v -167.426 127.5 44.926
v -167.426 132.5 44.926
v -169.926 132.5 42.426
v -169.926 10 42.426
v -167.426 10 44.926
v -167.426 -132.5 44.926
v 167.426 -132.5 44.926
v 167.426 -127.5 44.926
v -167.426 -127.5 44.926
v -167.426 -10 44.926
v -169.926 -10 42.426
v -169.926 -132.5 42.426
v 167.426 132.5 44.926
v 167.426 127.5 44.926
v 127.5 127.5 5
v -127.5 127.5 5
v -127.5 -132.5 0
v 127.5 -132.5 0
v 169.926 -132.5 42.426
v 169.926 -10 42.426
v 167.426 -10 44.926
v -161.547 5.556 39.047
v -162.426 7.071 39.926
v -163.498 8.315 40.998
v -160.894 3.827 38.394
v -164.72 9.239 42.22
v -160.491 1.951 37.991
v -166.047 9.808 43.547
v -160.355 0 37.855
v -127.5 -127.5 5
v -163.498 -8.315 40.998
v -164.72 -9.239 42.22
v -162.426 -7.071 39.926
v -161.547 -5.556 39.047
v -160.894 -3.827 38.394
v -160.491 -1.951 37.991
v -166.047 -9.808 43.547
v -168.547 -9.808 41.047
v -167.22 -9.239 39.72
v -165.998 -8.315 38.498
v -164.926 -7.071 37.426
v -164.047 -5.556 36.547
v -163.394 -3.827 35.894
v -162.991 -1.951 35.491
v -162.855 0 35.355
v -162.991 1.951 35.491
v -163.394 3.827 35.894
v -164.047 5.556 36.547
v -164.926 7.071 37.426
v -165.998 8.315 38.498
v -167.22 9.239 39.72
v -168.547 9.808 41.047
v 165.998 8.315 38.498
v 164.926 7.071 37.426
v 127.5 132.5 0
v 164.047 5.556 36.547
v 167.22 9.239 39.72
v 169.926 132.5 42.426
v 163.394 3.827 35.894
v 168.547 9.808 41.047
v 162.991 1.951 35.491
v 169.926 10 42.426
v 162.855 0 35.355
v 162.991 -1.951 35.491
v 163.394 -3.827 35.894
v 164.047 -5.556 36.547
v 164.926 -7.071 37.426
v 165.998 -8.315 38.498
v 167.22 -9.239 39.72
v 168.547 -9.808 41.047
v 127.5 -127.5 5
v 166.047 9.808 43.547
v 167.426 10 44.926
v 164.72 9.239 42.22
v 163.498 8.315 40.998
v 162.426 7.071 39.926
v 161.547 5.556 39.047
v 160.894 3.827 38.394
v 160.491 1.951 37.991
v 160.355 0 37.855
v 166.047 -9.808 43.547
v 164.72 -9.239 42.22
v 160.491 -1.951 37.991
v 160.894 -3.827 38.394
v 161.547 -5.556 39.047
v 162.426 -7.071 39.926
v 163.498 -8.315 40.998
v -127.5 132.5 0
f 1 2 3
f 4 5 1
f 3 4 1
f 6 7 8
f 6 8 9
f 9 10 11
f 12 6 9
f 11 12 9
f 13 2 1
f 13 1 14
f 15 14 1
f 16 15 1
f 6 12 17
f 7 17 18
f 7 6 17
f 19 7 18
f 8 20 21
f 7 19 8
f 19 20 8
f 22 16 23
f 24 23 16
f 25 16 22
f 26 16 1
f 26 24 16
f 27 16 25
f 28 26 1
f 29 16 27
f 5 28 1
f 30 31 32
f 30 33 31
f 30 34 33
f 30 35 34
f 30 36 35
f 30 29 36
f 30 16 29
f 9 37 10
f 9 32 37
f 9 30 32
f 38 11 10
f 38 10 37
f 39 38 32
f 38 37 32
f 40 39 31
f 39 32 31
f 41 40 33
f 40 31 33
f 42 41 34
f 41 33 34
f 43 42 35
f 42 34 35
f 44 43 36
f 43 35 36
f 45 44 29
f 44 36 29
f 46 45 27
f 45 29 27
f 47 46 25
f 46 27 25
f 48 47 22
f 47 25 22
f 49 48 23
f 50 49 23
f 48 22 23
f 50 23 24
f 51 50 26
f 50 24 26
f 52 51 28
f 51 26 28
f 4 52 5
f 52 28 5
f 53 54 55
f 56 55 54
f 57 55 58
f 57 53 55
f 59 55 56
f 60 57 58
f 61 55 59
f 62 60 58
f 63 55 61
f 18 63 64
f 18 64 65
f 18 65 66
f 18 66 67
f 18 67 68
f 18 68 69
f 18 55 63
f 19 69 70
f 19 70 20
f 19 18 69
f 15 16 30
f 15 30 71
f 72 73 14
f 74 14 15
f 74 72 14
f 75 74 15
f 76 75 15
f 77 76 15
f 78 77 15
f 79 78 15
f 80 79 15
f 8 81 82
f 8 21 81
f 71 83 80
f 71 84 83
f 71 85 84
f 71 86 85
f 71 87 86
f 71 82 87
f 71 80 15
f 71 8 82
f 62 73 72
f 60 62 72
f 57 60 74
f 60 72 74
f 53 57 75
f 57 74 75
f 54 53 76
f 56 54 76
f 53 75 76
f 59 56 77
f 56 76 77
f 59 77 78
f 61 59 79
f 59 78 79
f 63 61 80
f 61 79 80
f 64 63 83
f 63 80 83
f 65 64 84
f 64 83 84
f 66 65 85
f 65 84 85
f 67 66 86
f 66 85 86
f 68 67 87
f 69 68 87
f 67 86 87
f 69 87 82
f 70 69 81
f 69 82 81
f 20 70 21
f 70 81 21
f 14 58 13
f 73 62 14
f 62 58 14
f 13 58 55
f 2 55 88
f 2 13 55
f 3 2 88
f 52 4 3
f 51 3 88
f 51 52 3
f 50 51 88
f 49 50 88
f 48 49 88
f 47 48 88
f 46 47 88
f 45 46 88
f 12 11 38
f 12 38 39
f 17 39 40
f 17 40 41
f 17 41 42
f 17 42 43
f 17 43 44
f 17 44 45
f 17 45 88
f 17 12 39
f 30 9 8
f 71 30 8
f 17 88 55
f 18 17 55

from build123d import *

# Parameters (mm, degrees)
F0_W      = 255
F0_H      = 265
F1_DEPTH  = 5
F3_DEPTH  = 265
F4_R      = 10
F5_DEPTH  = 25
F7_DEPTH  = 25
F9_DEPTH  = 5
F11_DEPTH = 5


with BuildPart() as f1:
    # F0 (on Top) → F1 (new body)
    with BuildSketch(Plane.XY):
        Rectangle(F0_W, F0_H)
    extrude(amount=F1_DEPTH)

    # F2 (on face) → F3 (join)
    with BuildSketch(Plane.XZ.offset(132.5)):
        Polygon((-169.9264068712, 42.4264068712), (-127.5, 0), (-127.5, 5), (-167.4264068712, 44.9264068712), align=None)
        Polygon((127.5, 5), (127.5, 0), (169.9264068712, 42.4264068712), (167.4264068712, 44.9264068712), align=None)
    extrude(amount=-F3_DEPTH)

    # F4 (on face) → F5 (cut)
    with BuildSketch(Plane(origin=(-61.25, 0, -61.25), x_dir=(0, 1, 0), z_dir=(0.7071067812, 0, 0.7071067812))):
        with Locations((0, 150.1561146013)):
            Circle(F4_R)
    extrude(amount=-F5_DEPTH, mode=Mode.SUBTRACT)

    # F6 (on face) → F7 (cut)
    with BuildSketch(Plane(origin=(61.25, 0, -61.25), x_dir=(0, -1, 0), z_dir=(-0.7071067812, 0, 0.7071067812))):
        with BuildLine():
            ThreePointArc((-10, 150.1561146013), (0, 140.1561146013), (10, 150.1561146013))
            Line((10, 150.1561146013), (-10, 150.1561146013))
        make_face()
    extrude(amount=-F7_DEPTH, mode=Mode.SUBTRACT)

    # F8 (on face) → F9 (join)
    with BuildSketch(Plane.XZ.offset(132.5)):
        Polygon((167.4264068712, 44.9264068712), (-167.4264068712, 44.9264068712), (-127.5, 5), (127.5, 5), align=None)
    extrude(amount=-F9_DEPTH)

    # F10 (on face) → F11 (join)
    with BuildSketch(Plane(origin=(0, 132.5, 0), x_dir=(-1, 0, 0), z_dir=(0, 1, 0))):
        Polygon((167.4264068712, 44.9264068712), (-167.4264068712, 44.9264068712), (-127.5, 5), (127.5, 5), align=None)
    extrude(amount=-F11_DEPTH)


solid = f1.part
